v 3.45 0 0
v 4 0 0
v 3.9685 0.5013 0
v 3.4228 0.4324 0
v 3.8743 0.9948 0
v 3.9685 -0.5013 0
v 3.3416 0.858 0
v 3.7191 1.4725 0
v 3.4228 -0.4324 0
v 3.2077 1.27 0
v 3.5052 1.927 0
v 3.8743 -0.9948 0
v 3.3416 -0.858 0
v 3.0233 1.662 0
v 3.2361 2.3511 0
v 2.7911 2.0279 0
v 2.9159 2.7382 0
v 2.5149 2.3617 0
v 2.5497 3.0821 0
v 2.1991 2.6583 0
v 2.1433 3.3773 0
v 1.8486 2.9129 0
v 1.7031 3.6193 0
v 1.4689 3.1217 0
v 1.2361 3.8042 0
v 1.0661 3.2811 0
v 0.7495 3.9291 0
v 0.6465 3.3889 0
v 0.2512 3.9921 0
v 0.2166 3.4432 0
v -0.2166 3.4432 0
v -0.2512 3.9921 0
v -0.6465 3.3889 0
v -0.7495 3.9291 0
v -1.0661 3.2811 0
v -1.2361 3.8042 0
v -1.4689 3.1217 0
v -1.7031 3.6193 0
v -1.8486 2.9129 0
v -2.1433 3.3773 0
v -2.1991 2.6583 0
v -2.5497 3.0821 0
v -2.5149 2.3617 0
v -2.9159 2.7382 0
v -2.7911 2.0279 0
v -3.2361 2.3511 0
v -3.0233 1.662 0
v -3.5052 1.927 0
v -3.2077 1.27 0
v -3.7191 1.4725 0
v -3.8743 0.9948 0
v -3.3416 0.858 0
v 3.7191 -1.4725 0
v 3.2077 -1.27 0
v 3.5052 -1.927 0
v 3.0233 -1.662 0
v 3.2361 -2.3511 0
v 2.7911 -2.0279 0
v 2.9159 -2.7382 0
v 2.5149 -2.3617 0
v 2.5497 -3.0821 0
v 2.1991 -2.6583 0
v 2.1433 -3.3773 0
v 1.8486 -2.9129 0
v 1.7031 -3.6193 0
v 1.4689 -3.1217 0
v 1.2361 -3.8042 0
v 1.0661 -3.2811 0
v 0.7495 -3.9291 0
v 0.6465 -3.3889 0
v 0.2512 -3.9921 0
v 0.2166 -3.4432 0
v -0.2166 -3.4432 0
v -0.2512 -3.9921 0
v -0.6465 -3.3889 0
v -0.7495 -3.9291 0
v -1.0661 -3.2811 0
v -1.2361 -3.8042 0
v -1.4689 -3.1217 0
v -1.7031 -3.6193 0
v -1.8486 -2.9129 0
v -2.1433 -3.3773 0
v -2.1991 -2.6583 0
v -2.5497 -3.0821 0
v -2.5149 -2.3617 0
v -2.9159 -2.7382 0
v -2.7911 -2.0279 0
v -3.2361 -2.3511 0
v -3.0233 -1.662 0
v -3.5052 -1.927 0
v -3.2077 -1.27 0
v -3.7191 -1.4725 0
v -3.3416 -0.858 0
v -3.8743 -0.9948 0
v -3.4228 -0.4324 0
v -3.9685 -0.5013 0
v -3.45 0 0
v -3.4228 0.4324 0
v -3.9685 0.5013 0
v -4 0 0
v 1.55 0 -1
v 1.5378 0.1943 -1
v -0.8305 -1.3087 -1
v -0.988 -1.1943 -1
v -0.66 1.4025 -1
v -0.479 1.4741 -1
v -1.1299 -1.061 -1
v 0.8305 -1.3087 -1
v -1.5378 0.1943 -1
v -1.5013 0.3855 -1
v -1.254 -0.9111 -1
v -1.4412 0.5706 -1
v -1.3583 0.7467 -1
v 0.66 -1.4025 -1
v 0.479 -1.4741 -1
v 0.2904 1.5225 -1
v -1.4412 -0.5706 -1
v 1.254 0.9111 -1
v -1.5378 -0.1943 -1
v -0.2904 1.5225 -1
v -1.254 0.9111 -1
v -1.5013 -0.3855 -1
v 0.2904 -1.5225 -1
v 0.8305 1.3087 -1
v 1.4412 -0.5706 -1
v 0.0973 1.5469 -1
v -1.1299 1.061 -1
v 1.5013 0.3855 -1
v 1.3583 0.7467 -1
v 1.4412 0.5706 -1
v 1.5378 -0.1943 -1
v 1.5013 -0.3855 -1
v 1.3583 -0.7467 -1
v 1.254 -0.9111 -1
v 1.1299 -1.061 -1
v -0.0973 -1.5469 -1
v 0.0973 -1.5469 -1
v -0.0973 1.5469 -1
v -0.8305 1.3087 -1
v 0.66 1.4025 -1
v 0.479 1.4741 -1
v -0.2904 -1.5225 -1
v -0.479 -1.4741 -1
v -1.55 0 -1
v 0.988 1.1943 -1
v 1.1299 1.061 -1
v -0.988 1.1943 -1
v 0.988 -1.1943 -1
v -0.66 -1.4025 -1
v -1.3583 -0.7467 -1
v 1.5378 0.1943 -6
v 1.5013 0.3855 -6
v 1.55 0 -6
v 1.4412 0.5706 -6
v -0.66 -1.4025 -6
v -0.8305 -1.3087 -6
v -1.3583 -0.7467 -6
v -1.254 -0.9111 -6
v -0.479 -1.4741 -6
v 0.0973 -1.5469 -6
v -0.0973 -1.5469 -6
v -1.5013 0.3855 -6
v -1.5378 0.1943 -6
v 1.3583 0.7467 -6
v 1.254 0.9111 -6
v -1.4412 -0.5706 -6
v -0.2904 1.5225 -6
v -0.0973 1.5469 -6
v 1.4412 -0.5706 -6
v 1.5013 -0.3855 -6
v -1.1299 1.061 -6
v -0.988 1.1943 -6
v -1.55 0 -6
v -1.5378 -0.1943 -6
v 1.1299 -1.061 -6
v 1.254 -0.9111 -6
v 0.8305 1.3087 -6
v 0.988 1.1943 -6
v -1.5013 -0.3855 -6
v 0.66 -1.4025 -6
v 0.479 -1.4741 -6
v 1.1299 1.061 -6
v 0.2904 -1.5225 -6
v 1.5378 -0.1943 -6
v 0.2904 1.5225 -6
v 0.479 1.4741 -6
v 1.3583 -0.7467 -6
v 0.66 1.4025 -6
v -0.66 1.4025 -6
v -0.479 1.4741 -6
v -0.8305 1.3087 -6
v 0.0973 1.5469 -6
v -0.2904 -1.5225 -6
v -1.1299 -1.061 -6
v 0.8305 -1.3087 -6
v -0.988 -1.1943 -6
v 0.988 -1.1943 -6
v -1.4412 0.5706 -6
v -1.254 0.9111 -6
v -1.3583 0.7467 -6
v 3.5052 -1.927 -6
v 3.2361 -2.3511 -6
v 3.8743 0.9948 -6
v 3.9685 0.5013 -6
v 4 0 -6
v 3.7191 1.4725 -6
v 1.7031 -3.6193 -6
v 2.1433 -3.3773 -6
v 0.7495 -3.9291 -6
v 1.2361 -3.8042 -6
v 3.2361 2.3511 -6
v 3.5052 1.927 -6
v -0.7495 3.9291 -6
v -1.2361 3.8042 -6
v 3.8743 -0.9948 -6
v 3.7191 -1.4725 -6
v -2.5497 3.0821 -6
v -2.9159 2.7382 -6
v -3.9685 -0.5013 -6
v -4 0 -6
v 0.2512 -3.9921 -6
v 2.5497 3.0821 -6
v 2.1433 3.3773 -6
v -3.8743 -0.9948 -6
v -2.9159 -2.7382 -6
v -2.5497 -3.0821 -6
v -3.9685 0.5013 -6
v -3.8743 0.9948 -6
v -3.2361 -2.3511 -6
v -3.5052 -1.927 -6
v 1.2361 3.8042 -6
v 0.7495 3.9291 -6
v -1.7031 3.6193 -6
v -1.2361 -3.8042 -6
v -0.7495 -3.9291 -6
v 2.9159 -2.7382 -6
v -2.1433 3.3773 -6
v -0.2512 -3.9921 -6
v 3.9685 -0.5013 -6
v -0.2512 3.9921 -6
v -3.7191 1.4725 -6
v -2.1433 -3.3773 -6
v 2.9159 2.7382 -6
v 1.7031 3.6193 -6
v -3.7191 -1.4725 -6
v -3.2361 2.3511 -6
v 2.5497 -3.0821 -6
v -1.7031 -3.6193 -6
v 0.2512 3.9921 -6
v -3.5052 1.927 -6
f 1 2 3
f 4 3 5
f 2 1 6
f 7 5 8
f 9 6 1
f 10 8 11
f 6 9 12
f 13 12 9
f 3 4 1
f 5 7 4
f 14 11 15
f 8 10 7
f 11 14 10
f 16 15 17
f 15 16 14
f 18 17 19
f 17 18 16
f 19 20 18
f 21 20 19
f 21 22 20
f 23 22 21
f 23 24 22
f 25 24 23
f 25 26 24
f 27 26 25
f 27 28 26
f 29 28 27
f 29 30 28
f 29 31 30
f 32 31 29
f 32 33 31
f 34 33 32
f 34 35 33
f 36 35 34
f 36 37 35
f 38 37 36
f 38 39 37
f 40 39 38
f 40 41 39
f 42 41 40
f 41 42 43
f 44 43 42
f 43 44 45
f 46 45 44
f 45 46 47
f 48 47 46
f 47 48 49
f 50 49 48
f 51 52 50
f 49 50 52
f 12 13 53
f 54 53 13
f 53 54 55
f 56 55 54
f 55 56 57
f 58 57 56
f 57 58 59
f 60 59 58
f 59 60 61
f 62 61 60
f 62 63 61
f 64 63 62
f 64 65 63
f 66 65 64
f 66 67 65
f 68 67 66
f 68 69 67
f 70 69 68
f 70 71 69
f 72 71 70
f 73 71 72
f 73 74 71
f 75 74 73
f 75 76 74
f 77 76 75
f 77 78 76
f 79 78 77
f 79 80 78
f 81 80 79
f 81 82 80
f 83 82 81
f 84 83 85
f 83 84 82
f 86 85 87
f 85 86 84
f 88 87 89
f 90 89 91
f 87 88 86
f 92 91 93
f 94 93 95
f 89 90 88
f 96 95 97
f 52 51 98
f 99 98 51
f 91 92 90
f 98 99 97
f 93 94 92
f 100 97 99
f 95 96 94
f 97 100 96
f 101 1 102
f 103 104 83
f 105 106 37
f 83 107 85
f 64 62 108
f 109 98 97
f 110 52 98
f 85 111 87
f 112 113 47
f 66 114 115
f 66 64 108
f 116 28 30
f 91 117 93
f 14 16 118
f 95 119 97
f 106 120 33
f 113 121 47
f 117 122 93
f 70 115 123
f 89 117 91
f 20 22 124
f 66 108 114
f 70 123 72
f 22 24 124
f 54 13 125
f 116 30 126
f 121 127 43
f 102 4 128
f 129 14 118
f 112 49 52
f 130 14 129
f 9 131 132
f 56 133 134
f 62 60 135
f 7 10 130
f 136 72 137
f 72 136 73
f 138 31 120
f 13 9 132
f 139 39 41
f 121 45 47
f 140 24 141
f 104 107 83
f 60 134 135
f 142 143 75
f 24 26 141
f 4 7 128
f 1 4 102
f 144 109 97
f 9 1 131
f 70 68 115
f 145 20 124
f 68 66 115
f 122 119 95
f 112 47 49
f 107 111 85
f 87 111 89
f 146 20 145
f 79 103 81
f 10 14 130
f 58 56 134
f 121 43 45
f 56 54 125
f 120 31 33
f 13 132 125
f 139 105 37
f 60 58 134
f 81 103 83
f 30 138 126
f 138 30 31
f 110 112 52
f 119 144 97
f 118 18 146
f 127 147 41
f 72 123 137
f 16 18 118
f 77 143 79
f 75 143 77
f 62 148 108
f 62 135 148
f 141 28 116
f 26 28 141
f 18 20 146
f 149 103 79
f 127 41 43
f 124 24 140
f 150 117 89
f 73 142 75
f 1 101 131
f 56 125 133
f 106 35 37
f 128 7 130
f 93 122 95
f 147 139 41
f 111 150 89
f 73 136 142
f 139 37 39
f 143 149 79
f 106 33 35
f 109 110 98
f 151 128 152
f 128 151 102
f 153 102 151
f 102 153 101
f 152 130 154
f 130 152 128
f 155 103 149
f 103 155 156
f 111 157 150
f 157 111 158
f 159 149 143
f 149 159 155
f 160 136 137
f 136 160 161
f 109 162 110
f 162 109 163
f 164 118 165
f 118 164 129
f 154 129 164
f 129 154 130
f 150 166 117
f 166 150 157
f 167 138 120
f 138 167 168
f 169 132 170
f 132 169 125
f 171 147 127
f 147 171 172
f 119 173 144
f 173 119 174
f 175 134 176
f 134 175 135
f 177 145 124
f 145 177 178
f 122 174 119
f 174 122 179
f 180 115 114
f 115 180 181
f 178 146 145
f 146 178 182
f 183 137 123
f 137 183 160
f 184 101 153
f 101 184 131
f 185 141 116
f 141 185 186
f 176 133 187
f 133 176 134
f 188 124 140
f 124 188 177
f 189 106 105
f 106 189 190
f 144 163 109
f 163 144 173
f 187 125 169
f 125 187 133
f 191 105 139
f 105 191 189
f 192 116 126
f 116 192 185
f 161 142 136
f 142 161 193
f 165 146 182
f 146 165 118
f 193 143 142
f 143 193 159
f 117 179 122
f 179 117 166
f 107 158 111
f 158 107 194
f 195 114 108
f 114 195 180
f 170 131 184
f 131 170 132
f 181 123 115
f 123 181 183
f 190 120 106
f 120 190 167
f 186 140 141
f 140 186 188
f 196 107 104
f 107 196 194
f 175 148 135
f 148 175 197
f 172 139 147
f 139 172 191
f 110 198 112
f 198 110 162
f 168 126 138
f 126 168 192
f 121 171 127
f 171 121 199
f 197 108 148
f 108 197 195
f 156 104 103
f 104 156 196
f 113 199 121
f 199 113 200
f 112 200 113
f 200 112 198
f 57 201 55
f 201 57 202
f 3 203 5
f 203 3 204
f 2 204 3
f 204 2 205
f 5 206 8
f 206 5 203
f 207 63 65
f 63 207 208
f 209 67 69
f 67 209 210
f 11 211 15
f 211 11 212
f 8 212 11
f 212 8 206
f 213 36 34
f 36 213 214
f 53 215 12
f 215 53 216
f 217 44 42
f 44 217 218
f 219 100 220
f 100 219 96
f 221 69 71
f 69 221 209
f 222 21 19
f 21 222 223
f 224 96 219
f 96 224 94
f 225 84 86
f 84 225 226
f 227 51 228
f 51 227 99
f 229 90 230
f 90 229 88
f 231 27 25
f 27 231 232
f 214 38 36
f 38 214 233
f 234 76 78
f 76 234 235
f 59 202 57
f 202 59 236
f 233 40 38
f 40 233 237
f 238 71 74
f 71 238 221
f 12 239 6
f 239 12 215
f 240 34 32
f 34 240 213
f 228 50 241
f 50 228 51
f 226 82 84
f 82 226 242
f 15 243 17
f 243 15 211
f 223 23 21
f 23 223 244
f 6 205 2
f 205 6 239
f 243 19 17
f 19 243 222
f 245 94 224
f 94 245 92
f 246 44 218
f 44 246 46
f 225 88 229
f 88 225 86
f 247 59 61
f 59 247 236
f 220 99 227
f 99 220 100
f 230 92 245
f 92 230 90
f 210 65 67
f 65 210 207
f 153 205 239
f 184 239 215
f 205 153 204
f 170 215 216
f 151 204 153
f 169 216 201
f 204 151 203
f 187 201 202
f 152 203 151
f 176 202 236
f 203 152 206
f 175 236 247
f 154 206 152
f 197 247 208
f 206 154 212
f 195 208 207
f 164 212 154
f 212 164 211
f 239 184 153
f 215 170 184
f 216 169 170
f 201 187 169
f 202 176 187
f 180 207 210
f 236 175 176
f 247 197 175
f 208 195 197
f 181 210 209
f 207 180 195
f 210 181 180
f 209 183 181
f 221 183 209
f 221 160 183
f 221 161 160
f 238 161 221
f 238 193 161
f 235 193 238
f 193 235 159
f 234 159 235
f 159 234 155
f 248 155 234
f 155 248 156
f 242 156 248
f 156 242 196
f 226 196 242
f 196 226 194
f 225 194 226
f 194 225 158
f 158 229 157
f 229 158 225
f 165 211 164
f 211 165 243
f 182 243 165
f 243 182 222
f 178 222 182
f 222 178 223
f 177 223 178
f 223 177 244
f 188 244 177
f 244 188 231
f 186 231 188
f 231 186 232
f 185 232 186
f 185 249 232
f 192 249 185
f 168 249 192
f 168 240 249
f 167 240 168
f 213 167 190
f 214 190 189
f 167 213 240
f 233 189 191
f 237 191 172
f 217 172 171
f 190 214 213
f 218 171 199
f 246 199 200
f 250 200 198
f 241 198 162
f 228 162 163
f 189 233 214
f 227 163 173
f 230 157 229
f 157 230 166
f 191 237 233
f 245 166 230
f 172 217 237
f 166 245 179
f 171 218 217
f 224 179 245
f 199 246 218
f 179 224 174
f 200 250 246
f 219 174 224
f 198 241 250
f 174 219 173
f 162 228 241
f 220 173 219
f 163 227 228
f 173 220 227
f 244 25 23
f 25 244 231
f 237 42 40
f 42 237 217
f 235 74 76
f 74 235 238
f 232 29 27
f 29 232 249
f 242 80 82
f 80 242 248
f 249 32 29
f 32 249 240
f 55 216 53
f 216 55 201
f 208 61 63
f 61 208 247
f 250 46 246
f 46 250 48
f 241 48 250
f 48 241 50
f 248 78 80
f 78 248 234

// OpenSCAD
$fn = 50;

difference() {
	union() {
		translate(v = [0, 0, -6.0]) {
			cylinder(h = 6, r = 4.0);
		}
	}
	union() {
		translate(v = [0, 0, 0]) {
			rotate(a = [0, 0, 0]) {
				difference() {
					union() {
						translate(v = [0, 0, -9.0]) {
							cylinder(h = 9, r = 1.25);
						}
						translate(v = [0, 0, -1.0]) {
							cylinder(h = 1.0, r1 = 1.55, r2 = 3.45);
						}
						translate(v = [0, 0, -9.0]) {
							cylinder(h = 9, r = 1.55);
						}
						translate(v = [0, 0, -9.0]) {
							cylinder(h = 9, r = 1.25);
						}
					}
					union();
				}
			}
		}
	}
}
